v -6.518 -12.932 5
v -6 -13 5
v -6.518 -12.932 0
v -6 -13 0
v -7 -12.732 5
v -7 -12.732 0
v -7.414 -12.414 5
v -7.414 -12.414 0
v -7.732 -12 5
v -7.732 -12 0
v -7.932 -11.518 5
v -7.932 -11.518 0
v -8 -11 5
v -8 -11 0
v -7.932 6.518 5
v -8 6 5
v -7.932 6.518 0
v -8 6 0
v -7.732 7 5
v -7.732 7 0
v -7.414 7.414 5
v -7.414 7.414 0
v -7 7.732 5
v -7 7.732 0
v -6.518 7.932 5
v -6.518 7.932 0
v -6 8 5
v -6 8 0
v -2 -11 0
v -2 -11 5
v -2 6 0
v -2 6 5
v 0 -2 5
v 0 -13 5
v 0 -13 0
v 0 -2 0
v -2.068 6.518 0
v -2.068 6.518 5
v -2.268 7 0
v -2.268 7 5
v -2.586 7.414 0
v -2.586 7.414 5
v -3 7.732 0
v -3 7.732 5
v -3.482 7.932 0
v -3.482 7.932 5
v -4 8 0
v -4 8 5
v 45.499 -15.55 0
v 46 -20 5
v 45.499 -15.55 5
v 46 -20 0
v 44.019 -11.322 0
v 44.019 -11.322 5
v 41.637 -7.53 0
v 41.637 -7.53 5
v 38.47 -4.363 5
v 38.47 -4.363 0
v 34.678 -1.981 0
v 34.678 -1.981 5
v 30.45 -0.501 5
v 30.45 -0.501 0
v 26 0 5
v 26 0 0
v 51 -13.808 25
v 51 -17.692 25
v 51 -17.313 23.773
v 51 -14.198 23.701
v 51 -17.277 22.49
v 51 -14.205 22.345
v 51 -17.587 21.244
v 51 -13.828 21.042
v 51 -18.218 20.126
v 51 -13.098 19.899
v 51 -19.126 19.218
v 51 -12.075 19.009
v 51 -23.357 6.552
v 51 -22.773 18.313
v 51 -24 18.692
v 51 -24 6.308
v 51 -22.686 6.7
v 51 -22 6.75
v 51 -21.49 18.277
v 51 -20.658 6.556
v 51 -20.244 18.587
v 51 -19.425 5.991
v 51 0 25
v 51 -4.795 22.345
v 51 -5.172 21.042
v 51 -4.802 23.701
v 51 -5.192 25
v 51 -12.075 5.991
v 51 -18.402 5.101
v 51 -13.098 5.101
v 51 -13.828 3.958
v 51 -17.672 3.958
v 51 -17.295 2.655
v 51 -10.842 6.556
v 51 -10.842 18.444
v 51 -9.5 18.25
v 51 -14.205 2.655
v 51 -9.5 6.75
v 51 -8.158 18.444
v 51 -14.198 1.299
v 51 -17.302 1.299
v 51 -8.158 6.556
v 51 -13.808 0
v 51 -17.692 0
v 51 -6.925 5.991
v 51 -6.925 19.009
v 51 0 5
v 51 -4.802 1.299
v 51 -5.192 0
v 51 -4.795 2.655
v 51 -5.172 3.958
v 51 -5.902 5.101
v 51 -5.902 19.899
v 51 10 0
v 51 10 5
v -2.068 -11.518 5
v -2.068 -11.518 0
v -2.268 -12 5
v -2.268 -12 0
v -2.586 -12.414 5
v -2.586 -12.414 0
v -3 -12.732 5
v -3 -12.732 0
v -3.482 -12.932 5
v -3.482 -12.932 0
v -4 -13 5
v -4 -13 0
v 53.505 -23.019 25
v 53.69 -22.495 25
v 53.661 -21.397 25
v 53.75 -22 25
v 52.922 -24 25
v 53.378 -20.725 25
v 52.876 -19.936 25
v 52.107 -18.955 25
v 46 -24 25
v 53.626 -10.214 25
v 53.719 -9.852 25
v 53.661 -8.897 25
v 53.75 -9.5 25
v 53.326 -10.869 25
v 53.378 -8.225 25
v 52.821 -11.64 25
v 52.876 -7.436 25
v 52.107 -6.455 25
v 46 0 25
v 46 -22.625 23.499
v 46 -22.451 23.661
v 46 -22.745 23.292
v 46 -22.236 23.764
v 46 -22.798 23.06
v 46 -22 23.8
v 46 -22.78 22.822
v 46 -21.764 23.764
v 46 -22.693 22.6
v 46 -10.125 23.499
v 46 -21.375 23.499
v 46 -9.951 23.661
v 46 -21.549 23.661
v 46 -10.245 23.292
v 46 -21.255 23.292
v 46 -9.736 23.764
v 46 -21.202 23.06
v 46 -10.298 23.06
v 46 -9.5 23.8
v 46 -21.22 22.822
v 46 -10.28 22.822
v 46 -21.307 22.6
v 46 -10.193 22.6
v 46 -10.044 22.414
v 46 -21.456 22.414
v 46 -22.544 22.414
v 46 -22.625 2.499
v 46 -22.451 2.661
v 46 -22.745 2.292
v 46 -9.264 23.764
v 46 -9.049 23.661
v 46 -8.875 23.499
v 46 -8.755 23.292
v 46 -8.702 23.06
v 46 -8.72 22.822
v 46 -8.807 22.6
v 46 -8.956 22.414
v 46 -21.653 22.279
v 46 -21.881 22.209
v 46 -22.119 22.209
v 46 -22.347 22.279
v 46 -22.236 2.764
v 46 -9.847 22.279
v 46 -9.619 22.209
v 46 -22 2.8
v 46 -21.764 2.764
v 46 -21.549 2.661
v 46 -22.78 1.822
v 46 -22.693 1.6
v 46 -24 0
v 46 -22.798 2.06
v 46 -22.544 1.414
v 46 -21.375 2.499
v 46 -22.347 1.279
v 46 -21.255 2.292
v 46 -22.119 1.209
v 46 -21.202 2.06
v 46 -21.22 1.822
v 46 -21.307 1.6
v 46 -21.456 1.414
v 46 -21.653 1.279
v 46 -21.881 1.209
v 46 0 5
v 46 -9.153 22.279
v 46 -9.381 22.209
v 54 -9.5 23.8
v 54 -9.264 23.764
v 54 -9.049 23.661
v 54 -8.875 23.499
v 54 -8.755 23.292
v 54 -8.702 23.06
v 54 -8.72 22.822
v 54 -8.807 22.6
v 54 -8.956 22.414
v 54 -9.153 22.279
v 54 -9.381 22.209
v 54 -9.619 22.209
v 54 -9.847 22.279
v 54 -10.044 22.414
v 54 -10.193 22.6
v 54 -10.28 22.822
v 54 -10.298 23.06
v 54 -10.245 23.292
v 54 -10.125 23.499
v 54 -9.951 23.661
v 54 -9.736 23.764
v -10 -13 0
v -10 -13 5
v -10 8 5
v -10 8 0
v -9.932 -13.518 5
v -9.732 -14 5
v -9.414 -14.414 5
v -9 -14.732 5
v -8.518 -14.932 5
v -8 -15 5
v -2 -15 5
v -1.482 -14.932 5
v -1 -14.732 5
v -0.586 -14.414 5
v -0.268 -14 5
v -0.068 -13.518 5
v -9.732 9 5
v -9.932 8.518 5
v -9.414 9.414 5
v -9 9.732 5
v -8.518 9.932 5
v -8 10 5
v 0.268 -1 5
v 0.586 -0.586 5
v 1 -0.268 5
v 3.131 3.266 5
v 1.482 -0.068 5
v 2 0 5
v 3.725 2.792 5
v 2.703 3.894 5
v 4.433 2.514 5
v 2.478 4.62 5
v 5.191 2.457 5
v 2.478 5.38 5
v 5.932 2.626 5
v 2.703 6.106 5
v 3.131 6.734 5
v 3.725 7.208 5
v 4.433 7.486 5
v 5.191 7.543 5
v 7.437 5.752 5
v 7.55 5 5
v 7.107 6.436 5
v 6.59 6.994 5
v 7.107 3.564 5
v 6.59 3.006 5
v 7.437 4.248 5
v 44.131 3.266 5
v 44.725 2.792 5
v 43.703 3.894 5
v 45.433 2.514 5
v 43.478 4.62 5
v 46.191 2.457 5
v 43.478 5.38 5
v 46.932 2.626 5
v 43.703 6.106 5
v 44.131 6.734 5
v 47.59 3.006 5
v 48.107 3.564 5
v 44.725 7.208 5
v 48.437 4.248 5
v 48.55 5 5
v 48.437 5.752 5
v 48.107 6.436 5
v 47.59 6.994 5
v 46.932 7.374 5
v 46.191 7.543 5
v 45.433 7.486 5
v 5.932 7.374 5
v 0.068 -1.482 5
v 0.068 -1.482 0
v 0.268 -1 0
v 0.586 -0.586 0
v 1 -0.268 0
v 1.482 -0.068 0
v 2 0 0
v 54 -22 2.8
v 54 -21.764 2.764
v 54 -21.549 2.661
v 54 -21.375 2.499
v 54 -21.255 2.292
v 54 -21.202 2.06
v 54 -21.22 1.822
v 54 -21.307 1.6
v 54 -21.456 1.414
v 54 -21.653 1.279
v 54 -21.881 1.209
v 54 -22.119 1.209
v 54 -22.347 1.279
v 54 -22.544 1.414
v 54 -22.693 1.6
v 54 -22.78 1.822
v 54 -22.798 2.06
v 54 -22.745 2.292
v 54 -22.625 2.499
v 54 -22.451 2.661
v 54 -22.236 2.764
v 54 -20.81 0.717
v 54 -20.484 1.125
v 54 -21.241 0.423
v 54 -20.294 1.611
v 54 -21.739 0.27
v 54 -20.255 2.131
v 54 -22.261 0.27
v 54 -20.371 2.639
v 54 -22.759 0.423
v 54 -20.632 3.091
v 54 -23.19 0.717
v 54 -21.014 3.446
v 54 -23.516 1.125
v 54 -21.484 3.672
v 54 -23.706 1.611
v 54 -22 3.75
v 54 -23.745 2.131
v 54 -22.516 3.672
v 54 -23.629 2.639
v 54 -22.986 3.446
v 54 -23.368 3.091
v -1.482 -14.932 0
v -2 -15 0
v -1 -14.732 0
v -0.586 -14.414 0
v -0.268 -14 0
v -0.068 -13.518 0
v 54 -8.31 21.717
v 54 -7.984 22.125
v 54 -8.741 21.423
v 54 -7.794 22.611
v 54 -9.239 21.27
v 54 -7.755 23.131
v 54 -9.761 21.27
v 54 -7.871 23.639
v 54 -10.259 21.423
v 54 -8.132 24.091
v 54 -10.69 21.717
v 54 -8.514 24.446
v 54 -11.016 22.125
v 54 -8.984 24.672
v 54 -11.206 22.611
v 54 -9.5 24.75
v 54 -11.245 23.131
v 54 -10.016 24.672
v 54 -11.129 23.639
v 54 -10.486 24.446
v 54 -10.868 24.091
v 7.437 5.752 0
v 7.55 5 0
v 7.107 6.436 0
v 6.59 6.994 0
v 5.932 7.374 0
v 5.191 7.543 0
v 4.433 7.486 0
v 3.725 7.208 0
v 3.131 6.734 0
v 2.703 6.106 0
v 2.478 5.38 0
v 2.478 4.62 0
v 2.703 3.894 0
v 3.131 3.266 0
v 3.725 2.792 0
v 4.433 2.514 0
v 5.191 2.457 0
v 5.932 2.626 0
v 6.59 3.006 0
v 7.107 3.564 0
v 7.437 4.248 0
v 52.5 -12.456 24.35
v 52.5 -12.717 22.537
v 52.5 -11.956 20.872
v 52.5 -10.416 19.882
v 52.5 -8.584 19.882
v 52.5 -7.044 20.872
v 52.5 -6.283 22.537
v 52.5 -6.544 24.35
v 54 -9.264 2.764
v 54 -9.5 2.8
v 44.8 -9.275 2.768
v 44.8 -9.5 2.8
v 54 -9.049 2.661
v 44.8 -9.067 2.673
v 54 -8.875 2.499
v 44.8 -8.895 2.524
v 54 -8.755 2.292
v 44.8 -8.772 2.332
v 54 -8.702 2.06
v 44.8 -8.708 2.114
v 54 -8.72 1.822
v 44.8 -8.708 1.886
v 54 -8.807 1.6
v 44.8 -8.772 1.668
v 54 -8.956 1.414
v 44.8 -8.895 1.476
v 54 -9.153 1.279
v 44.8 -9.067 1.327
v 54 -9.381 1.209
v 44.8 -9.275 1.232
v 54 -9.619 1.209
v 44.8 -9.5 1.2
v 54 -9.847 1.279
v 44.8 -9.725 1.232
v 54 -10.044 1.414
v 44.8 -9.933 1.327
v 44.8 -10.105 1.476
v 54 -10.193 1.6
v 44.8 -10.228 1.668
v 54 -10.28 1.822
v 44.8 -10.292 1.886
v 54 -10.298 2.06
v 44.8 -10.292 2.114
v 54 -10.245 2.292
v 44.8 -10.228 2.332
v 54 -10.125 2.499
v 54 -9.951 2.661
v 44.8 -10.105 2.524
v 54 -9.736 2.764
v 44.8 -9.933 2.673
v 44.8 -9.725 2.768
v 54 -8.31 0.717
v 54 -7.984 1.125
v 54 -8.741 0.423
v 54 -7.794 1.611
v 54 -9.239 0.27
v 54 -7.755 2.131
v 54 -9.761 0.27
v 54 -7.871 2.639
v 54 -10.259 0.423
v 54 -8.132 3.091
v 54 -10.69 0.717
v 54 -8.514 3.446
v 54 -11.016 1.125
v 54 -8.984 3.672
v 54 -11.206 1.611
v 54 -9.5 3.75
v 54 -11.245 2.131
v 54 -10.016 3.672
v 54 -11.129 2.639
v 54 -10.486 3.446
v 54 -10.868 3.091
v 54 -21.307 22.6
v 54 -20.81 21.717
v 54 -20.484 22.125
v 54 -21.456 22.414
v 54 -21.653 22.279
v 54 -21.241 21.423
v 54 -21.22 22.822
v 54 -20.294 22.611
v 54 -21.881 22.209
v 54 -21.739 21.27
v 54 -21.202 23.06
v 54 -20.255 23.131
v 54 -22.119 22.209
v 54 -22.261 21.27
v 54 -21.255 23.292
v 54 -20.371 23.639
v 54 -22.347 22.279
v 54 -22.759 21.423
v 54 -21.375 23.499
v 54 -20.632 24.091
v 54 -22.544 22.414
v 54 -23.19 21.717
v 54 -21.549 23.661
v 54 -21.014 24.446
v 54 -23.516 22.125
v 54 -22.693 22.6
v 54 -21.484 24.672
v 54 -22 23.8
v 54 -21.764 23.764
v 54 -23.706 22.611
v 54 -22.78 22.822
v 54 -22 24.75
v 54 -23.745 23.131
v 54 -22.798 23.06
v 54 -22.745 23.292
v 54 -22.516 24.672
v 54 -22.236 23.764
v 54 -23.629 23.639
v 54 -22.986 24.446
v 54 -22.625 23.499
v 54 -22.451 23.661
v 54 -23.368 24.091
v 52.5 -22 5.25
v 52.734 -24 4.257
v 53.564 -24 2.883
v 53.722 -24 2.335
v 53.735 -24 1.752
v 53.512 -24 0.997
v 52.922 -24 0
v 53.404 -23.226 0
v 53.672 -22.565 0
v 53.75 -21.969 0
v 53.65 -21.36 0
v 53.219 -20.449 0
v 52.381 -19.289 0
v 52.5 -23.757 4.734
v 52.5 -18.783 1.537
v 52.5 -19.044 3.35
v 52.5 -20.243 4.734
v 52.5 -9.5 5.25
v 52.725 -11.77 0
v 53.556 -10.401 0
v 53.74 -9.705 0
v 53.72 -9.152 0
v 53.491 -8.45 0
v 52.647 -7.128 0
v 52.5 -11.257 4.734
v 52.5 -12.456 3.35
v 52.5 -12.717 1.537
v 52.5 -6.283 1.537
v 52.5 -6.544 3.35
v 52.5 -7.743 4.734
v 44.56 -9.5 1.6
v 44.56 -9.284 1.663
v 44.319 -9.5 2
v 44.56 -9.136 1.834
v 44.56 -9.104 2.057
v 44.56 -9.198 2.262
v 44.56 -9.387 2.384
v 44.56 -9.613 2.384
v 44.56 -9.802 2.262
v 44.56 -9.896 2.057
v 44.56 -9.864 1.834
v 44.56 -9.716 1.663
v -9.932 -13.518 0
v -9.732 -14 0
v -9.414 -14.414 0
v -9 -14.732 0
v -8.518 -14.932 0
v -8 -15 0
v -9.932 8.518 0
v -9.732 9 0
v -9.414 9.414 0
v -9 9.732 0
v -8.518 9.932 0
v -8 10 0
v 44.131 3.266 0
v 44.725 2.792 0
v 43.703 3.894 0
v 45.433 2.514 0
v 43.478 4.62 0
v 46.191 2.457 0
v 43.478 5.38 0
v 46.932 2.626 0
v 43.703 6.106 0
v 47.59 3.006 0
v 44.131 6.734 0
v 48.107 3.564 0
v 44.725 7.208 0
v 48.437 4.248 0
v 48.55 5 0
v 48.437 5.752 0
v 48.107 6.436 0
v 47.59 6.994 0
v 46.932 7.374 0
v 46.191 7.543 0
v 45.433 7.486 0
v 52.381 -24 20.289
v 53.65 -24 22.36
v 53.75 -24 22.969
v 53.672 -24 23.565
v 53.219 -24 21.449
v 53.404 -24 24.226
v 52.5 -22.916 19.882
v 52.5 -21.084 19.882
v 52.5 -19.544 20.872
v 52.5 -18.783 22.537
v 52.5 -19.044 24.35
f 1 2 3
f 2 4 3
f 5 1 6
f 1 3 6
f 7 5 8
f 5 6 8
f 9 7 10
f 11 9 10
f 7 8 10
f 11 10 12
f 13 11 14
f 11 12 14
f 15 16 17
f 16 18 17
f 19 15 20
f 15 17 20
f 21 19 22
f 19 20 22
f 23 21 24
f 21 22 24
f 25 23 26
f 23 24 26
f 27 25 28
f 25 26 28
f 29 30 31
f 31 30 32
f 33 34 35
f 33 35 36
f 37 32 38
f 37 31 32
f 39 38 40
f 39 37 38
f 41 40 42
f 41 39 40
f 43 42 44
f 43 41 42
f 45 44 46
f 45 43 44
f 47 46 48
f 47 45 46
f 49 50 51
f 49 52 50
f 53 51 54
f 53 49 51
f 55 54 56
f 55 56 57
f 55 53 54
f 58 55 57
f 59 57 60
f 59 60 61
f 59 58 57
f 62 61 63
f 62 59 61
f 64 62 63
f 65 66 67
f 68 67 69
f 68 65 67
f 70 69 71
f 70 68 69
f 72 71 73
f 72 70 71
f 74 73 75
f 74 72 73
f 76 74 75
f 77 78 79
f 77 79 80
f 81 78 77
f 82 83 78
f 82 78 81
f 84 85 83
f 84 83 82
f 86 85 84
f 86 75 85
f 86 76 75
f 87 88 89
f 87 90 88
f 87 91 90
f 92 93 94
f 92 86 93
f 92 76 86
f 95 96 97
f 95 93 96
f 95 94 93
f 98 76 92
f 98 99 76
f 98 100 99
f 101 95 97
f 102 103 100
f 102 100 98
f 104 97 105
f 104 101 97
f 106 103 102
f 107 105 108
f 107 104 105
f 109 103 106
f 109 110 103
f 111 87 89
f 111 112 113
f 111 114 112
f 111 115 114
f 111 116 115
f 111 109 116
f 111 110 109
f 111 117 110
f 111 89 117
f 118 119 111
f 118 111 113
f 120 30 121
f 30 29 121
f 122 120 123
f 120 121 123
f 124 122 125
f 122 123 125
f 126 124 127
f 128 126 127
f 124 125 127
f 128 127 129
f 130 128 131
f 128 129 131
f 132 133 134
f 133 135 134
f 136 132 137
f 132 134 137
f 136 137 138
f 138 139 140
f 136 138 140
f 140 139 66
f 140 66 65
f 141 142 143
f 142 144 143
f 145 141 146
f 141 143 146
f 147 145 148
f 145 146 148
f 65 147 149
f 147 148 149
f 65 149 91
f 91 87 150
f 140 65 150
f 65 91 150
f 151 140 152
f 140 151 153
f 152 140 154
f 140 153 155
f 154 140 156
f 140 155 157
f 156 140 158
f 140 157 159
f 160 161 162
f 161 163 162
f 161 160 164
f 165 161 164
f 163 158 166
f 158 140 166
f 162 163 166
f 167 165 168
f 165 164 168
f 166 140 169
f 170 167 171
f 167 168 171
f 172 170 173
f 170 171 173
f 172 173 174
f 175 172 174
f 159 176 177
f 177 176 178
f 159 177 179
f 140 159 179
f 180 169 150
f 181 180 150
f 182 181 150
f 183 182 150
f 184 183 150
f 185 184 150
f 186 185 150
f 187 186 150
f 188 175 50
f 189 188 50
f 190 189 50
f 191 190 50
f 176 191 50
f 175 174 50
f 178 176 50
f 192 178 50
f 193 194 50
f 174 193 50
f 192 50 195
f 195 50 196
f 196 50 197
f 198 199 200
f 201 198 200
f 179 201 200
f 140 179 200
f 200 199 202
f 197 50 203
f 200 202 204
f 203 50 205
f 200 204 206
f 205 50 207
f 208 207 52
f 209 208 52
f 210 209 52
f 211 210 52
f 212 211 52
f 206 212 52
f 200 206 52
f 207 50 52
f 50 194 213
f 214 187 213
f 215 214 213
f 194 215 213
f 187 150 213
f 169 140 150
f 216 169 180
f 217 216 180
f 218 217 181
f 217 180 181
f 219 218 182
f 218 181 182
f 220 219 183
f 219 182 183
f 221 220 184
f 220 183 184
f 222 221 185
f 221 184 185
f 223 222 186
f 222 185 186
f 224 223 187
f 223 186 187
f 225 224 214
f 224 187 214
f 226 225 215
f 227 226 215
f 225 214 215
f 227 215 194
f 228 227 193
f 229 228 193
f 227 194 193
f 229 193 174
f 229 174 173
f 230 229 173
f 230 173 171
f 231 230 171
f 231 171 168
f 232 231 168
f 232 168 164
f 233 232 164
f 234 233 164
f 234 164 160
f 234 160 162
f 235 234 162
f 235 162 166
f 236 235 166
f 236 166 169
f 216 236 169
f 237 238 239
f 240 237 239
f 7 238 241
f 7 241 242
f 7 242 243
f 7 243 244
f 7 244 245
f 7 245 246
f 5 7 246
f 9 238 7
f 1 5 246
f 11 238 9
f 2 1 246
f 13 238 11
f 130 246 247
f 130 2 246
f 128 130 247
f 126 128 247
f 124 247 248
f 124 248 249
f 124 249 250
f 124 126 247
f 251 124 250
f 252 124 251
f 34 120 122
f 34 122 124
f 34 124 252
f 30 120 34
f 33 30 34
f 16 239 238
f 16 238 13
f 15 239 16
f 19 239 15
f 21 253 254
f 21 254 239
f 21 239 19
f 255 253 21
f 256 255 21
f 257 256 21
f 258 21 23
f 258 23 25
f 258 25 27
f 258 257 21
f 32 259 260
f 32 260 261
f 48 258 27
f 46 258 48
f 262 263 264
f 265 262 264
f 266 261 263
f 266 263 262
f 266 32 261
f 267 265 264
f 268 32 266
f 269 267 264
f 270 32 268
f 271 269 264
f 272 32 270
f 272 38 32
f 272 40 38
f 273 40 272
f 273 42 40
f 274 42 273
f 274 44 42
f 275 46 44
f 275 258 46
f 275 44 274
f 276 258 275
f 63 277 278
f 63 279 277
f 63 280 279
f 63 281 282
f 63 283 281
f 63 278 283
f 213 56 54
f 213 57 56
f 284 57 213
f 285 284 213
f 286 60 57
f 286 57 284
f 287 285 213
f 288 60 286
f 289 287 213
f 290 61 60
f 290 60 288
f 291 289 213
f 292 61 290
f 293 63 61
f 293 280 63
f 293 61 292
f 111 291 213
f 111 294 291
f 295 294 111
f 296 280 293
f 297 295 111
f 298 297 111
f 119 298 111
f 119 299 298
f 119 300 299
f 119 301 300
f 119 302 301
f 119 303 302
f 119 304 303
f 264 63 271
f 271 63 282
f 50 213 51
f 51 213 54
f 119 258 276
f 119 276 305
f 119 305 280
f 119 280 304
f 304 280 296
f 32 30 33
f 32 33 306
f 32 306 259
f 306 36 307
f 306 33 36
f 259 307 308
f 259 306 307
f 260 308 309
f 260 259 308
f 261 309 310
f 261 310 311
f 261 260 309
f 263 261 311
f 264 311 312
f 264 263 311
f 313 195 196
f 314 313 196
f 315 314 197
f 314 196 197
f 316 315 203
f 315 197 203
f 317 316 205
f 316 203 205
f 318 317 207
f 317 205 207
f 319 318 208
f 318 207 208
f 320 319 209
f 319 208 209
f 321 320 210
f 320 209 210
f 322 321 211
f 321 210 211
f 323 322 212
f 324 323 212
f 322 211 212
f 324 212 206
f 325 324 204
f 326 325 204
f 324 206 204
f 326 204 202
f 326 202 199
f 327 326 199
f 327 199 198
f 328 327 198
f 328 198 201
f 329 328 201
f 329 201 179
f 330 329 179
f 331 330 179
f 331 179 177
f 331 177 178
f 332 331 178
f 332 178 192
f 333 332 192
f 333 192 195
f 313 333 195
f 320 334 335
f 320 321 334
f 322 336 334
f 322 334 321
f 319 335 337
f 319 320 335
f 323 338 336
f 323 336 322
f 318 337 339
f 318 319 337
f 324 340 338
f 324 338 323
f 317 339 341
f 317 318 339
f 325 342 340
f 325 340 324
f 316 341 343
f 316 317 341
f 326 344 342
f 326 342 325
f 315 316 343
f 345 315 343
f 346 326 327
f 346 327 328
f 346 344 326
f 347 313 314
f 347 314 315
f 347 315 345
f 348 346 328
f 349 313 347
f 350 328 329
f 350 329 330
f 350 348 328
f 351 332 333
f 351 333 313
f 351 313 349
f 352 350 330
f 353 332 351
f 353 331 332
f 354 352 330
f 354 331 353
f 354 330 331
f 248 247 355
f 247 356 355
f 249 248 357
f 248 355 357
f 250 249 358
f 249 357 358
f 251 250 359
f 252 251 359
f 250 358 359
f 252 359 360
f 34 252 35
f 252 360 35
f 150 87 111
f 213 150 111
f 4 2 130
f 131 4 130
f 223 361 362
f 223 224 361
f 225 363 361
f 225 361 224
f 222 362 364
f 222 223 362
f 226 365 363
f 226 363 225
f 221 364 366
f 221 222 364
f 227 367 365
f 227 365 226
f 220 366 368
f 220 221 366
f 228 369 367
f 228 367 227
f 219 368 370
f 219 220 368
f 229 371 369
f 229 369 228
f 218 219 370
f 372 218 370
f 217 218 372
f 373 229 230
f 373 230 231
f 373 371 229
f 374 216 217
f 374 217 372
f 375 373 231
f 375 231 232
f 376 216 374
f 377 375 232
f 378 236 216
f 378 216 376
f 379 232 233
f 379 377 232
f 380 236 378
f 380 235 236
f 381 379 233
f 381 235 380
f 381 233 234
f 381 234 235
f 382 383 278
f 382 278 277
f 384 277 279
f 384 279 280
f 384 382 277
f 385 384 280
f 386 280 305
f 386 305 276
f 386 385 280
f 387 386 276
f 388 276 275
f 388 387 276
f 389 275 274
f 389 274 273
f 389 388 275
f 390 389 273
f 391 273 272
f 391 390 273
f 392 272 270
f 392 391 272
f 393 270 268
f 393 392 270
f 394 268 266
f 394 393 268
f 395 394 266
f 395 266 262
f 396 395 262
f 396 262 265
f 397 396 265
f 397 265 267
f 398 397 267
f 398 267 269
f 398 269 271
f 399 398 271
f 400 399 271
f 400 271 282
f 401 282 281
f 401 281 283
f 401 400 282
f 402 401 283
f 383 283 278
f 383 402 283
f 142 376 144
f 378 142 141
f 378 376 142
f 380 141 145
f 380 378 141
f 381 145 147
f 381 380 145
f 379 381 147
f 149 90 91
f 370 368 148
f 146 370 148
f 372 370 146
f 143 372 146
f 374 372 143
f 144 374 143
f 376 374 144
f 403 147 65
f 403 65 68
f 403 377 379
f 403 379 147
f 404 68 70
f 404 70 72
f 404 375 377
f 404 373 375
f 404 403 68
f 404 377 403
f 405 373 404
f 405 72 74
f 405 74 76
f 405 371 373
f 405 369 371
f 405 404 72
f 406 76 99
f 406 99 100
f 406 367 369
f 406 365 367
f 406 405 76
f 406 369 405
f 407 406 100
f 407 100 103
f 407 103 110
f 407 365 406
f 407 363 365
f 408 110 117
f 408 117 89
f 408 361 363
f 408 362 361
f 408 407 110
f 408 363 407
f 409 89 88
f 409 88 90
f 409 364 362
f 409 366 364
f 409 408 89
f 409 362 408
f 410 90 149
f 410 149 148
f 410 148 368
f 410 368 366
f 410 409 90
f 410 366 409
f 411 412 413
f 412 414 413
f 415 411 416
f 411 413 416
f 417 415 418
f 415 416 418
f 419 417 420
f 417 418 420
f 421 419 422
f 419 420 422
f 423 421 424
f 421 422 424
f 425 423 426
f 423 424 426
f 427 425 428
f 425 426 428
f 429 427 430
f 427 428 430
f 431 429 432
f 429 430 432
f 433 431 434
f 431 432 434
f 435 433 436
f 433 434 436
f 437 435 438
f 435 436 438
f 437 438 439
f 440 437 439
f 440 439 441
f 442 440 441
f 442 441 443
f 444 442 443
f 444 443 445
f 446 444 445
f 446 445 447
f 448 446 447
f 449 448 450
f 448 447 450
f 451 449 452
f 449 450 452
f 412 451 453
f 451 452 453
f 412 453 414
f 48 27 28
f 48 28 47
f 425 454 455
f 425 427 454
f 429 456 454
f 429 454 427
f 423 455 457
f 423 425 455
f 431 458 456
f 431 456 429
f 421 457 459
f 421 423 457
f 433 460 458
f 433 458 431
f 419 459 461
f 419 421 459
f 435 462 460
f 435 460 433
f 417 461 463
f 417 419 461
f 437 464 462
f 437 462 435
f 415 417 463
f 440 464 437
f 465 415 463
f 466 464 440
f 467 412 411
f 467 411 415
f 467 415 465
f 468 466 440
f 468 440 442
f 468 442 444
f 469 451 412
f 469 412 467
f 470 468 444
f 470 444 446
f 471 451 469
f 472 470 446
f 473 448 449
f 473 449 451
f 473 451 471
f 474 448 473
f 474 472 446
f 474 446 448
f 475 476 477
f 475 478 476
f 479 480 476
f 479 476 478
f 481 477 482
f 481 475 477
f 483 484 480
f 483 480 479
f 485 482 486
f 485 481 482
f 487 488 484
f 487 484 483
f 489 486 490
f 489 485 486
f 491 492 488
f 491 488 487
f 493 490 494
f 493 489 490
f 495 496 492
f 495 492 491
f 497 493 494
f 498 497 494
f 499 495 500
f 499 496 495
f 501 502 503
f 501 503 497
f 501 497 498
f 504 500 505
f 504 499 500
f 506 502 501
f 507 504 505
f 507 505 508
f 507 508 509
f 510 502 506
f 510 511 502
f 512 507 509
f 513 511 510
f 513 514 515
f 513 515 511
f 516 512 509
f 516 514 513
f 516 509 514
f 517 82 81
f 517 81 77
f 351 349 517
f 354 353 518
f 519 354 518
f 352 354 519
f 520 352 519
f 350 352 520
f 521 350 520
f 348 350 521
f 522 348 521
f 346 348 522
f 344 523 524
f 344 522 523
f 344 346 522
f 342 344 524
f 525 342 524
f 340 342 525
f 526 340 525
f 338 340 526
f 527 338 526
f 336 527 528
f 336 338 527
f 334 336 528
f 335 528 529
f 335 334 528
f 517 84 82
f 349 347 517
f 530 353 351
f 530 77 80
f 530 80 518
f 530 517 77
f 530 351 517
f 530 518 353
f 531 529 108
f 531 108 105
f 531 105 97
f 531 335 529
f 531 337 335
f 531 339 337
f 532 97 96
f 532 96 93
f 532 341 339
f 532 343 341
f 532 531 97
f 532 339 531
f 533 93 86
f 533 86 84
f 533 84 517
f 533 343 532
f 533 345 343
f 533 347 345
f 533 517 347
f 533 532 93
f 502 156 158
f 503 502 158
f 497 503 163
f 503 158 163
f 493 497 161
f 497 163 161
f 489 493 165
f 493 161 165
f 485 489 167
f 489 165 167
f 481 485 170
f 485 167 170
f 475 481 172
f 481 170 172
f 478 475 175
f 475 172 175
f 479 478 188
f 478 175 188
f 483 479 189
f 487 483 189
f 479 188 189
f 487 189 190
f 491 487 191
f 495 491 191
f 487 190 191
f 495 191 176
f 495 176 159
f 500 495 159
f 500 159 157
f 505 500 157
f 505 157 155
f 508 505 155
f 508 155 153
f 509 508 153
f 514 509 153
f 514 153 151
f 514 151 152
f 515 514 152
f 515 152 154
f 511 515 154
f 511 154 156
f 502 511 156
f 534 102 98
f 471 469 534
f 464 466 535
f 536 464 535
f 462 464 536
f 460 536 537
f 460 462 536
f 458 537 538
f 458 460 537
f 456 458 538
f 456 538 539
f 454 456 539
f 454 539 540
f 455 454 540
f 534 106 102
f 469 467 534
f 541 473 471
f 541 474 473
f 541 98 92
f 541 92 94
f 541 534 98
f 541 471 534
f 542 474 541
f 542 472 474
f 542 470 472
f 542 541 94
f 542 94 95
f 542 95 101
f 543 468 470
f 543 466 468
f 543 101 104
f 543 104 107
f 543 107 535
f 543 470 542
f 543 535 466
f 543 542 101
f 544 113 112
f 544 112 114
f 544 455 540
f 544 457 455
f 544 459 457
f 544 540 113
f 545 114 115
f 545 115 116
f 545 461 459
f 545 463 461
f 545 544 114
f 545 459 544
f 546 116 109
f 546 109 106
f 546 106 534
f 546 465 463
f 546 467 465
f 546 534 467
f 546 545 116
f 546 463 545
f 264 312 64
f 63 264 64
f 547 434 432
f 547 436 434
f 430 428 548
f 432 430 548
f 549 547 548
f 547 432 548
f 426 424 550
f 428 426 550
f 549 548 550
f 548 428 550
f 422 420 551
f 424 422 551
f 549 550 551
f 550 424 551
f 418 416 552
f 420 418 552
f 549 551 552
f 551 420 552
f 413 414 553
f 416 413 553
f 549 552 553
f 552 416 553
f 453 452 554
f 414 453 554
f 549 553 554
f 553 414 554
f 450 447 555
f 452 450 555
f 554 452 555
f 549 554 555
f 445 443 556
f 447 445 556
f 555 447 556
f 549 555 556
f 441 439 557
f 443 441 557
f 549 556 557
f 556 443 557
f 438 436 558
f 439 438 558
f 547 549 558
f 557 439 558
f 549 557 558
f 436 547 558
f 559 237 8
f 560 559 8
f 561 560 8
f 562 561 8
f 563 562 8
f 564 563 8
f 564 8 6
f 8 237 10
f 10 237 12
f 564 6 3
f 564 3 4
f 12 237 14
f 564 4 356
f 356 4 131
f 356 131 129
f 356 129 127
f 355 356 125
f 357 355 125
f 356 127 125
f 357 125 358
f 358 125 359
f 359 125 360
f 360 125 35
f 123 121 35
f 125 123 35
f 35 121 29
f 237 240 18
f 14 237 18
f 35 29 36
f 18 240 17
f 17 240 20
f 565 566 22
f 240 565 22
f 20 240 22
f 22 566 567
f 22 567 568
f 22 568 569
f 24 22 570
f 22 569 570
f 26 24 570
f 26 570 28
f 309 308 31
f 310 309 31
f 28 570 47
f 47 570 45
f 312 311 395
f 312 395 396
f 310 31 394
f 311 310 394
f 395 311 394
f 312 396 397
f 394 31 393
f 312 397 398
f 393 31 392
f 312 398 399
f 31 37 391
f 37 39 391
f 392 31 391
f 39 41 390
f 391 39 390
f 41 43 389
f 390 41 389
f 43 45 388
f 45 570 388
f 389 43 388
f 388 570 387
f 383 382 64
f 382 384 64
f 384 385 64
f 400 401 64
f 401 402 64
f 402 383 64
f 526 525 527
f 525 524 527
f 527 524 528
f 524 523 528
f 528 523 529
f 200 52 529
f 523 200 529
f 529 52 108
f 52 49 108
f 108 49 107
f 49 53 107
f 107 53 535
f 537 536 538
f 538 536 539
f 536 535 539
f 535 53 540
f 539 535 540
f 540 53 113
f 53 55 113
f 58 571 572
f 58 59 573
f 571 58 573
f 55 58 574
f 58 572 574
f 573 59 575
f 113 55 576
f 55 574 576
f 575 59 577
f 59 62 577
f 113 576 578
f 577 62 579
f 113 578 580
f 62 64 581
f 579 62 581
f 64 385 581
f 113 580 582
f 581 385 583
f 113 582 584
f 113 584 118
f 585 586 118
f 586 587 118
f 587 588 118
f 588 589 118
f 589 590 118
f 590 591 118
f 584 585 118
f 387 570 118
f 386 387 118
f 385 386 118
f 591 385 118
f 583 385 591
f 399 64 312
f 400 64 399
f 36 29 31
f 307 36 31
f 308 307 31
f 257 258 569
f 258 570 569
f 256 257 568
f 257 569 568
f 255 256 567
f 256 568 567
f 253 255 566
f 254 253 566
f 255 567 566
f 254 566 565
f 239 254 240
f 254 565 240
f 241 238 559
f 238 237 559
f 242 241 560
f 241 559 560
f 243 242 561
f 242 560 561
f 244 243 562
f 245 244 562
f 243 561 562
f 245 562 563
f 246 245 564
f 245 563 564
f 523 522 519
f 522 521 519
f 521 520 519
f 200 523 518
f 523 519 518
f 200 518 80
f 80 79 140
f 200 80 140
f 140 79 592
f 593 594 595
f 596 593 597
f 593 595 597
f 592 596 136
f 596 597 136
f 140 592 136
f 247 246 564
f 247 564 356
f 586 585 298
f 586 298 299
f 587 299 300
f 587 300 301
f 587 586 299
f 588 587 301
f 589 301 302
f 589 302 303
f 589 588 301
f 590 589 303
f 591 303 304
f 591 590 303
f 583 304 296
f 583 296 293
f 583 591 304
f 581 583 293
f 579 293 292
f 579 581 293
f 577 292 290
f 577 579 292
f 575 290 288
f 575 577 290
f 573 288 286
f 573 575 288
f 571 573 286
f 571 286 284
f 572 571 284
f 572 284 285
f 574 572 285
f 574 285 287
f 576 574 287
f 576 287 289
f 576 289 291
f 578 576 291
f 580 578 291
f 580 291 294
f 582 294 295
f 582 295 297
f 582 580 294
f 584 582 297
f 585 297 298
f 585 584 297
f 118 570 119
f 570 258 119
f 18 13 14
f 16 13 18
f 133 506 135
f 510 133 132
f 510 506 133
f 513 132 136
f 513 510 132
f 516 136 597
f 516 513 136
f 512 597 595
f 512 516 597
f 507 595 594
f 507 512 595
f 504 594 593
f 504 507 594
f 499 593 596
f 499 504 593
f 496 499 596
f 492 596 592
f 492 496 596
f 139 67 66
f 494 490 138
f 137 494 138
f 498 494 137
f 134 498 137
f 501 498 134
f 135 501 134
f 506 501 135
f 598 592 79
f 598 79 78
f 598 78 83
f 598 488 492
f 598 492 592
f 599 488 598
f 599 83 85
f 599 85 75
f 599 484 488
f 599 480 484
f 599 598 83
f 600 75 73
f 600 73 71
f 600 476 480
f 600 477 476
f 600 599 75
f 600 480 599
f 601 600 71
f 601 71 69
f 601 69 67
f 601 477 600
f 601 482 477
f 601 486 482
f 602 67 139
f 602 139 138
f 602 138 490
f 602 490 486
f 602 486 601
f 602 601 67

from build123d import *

# Parameters (mm, degrees)
SKETCH1_W                 = 51
SKETCH1_H                 = 10
SKETCH1_R                 = 2.55
BOSS_EXTRUDE1_DEPTH       = 5
SKETCH3_W                 = 10
SKETCH3_H                 = 25
SKETCH3_W_2               = 6
SKETCH3_H_2               = 21
BOSS_EXTRUDE2_DEPTH       = 5
SKETCH5_W                 = 25
SKETCH5_H                 = 24
BOSS_EXTRUDE3_DEPTH       = 5
FILLET1_R                 = 20
SKETCH6_R                 = 1.75
BOSS_EXTRUDE4_DEPTH       = 3
CHAMFER1_SIZE             = 3
M2X0_4_TAPPED_HOLE1_D     = 1.6
M2X0_4_TAPPED_HOLE1_DEPTH = 9.2
M2X0_4_TAPPED_HOLE1_TIP   = 0.480688495
FILLET2_R                 = 2


with BuildPart() as part:
    # Sketch1 → Boss-Extrude1 (new body)
    with BuildSketch(Plane.XY):
        with Locations((25.5, 5)):
            Rectangle(SKETCH1_W, SKETCH1_H)
        with Locations((5, 5)):
            Circle(SKETCH1_R, mode=Mode.SUBTRACT)
        with Locations((46, 5)):
            Circle(SKETCH1_R, mode=Mode.SUBTRACT)
    extrude(amount=BOSS_EXTRUDE1_DEPTH)

    # Sketch3 → Boss-Extrude2 (add)
    with BuildSketch(Plane.XY.offset(5)):
        with Locations((-5, -2.5)):
            Rectangle(SKETCH3_W, SKETCH3_H)
        with Locations((-5, -2.5)):
            Rectangle(SKETCH3_W_2, SKETCH3_H_2, mode=Mode.SUBTRACT)
    extrude(amount=-BOSS_EXTRUDE2_DEPTH)

    # Sketch5 → Boss-Extrude3 (add)
    with BuildSketch(Plane(origin=(51, 0, 0), x_dir=(0, 0, -1), z_dir=(1, 0, 0))):
        with Locations((-12.5, -12)):
            Rectangle(SKETCH5_W, SKETCH5_H)
    extrude(amount=-BOSS_EXTRUDE3_DEPTH)

    # Fillet1
    fillet1_edges = [part.edges().sort_by_distance(p)[0] for p in [
        (46, 0, 2.5),
    ]]
    fillet(fillet1_edges, radius=FILLET1_R)

    # Sketch6 → Boss-Extrude4 (add)
    with BuildSketch(Plane(origin=(51, 0, 0), x_dir=(0, 0, -1), z_dir=(1, 0, 0))):
        with Locations(Location((-23, -9.5, 0), (0, 0, 180))):
            Circle(SKETCH6_R)
        with Locations(Location((-23, -22, 0), (0, 0, 180))):
            Circle(SKETCH6_R)
        with Locations(Location((-2, -22, 0), (0, 0, 180))):
            Circle(SKETCH6_R)
        with Locations(Location((-2, -9.5, 0), (0, 0, 180))):
            Circle(SKETCH6_R)
    extrude(amount=BOSS_EXTRUDE4_DEPTH)

    # Chamfer1
    # the kernel refuses this chamfer: 3 mm, written as the material it adds along each edge
    with BuildSketch(Plane(origin=(51, -9.5, 23), x_dir=(0, 0, 1), z_dir=(0, 1, 0))) as chamfer1_piece_1_section:
        Polygon((1.75 + CHAMFER1_SIZE, 0), (1.75, CHAMFER1_SIZE), (1.75, 0), align=None)
    chamfer1_piece_1 = revolve(axis=Axis((51, -9.5, 23), (1, 0, 0)), mode=Mode.PRIVATE)
    chamfer1_piece_1 = split(chamfer1_piece_1, bisect_by=Plane(origin=(52.428955804, -9.5, 25), z_dir=(0, 0, -1)), keep=Keep.TOP, mode=Mode.PRIVATE)
    chamfer1_piece_1 = split(chamfer1_piece_1, bisect_by=Plane(origin=(54, -9.5, 19.736191383), z_dir=(-1, 0, 0)), keep=Keep.TOP, mode=Mode.PRIVATE)
    add(chamfer1_piece_1)
    with BuildSketch(Plane(origin=(51, -22, 23), x_dir=(0, 0, 1), z_dir=(0, 1, 0))) as chamfer1_piece_2_section:
        Polygon((1.75 + CHAMFER1_SIZE, 0), (1.75, CHAMFER1_SIZE), (1.75, 0), align=None)
    chamfer1_piece_2 = revolve(axis=Axis((51, -22, 23), (1, 0, 0)), mode=Mode.PRIVATE)
    chamfer1_piece_2 = split(chamfer1_piece_2, bisect_by=Plane(origin=(52.431534605, -24, 19.733612581), z_dir=(0, 1, 0)), keep=Keep.TOP, mode=Mode.PRIVATE)
    chamfer1_piece_2 = split(chamfer1_piece_2, bisect_by=Plane(origin=(52.431534605, -22, 25), z_dir=(0, 0, -1)), keep=Keep.TOP, mode=Mode.PRIVATE)
    chamfer1_piece_2 = split(chamfer1_piece_2, bisect_by=Plane(origin=(54, -22, 19.733612581), z_dir=(-1, 0, 0)), keep=Keep.TOP, mode=Mode.PRIVATE)
    add(chamfer1_piece_2)
    with BuildSketch(Plane(origin=(51, -22, 2), x_dir=(0, 0, 1), z_dir=(0, 1, 0))) as chamfer1_piece_3_section:
        Polygon((1.75 + CHAMFER1_SIZE, 0), (1.75, CHAMFER1_SIZE), (1.75, 0), align=None)
    chamfer1_piece_3 = revolve(axis=Axis((51, -22, 2), (1, 0, 0)), mode=Mode.PRIVATE)
    chamfer1_piece_3 = split(chamfer1_piece_3, bisect_by=Plane(origin=(53.459818879, -23.938254184, 0), z_dir=(0, 0, 1)), keep=Keep.TOP, mode=Mode.PRIVATE)
    chamfer1_piece_3 = split(chamfer1_piece_3, bisect_by=Plane(origin=(53.459818879, -24, 3.119051575), z_dir=(0, 1, 0)), keep=Keep.TOP, mode=Mode.PRIVATE)
    chamfer1_piece_3 = split(chamfer1_piece_3, bisect_by=Plane(origin=(54, -23.938254184, 3.119051575), z_dir=(-1, 0, 0)), keep=Keep.TOP, mode=Mode.PRIVATE)
    add(chamfer1_piece_3)
    with BuildSketch(Plane(origin=(51, -9.5, 2), x_dir=(0, 0, 1), z_dir=(0, 1, 0))) as chamfer1_piece_4_section:
        Polygon((1.75 + CHAMFER1_SIZE, 0), (1.75, CHAMFER1_SIZE), (1.75, 0), align=None)
    chamfer1_piece_4 = revolve(axis=Axis((51, -9.5, 2), (1, 0, 0)), mode=Mode.PRIVATE)
    chamfer1_piece_4 = split(chamfer1_piece_4, bisect_by=Plane(origin=(51.400671534, -13.217061478, 0), z_dir=(0, 0, 1)), keep=Keep.TOP, mode=Mode.PRIVATE)
    chamfer1_piece_4 = split(chamfer1_piece_4, bisect_by=Plane(origin=(54, -13.217061478, 4.146046445), z_dir=(-1, 0, 0)), keep=Keep.TOP, mode=Mode.PRIVATE)
    add(chamfer1_piece_4)

    # M2x0.4 Tapped Hole1
    with Locations(Plane(origin=(54, 0, 0), x_dir=(0, 0, -1), z_dir=(1, 0, 0))):
        with Locations((-23, -22), (-23, -9.5), (-2, -9.5), (-2, -22)):
            Hole(M2X0_4_TAPPED_HOLE1_D / 2, depth=M2X0_4_TAPPED_HOLE1_DEPTH)
            with Locations((0, 0, -(M2X0_4_TAPPED_HOLE1_DEPTH + M2X0_4_TAPPED_HOLE1_TIP / 2))):  # 118° drill point
                Cone(0, M2X0_4_TAPPED_HOLE1_D / 2, M2X0_4_TAPPED_HOLE1_TIP, mode=Mode.SUBTRACT)

    # Fillet2
    fillet2_edges = [part.edges().sort_by_distance(p)[0] for p in [
        (0, -15, 2.5),
        (-10, -15, 2.5),
        (-10, 10, 2.5),
        (-2, -13, 2.5),
        (-8, -13, 2.5),
        (-8, 8, 2.5),
        (-2, 8, 2.5),
        (0, 0, 2.5),
    ]]
    fillet(fillet2_edges, radius=FILLET2_R)


solid = part.part
